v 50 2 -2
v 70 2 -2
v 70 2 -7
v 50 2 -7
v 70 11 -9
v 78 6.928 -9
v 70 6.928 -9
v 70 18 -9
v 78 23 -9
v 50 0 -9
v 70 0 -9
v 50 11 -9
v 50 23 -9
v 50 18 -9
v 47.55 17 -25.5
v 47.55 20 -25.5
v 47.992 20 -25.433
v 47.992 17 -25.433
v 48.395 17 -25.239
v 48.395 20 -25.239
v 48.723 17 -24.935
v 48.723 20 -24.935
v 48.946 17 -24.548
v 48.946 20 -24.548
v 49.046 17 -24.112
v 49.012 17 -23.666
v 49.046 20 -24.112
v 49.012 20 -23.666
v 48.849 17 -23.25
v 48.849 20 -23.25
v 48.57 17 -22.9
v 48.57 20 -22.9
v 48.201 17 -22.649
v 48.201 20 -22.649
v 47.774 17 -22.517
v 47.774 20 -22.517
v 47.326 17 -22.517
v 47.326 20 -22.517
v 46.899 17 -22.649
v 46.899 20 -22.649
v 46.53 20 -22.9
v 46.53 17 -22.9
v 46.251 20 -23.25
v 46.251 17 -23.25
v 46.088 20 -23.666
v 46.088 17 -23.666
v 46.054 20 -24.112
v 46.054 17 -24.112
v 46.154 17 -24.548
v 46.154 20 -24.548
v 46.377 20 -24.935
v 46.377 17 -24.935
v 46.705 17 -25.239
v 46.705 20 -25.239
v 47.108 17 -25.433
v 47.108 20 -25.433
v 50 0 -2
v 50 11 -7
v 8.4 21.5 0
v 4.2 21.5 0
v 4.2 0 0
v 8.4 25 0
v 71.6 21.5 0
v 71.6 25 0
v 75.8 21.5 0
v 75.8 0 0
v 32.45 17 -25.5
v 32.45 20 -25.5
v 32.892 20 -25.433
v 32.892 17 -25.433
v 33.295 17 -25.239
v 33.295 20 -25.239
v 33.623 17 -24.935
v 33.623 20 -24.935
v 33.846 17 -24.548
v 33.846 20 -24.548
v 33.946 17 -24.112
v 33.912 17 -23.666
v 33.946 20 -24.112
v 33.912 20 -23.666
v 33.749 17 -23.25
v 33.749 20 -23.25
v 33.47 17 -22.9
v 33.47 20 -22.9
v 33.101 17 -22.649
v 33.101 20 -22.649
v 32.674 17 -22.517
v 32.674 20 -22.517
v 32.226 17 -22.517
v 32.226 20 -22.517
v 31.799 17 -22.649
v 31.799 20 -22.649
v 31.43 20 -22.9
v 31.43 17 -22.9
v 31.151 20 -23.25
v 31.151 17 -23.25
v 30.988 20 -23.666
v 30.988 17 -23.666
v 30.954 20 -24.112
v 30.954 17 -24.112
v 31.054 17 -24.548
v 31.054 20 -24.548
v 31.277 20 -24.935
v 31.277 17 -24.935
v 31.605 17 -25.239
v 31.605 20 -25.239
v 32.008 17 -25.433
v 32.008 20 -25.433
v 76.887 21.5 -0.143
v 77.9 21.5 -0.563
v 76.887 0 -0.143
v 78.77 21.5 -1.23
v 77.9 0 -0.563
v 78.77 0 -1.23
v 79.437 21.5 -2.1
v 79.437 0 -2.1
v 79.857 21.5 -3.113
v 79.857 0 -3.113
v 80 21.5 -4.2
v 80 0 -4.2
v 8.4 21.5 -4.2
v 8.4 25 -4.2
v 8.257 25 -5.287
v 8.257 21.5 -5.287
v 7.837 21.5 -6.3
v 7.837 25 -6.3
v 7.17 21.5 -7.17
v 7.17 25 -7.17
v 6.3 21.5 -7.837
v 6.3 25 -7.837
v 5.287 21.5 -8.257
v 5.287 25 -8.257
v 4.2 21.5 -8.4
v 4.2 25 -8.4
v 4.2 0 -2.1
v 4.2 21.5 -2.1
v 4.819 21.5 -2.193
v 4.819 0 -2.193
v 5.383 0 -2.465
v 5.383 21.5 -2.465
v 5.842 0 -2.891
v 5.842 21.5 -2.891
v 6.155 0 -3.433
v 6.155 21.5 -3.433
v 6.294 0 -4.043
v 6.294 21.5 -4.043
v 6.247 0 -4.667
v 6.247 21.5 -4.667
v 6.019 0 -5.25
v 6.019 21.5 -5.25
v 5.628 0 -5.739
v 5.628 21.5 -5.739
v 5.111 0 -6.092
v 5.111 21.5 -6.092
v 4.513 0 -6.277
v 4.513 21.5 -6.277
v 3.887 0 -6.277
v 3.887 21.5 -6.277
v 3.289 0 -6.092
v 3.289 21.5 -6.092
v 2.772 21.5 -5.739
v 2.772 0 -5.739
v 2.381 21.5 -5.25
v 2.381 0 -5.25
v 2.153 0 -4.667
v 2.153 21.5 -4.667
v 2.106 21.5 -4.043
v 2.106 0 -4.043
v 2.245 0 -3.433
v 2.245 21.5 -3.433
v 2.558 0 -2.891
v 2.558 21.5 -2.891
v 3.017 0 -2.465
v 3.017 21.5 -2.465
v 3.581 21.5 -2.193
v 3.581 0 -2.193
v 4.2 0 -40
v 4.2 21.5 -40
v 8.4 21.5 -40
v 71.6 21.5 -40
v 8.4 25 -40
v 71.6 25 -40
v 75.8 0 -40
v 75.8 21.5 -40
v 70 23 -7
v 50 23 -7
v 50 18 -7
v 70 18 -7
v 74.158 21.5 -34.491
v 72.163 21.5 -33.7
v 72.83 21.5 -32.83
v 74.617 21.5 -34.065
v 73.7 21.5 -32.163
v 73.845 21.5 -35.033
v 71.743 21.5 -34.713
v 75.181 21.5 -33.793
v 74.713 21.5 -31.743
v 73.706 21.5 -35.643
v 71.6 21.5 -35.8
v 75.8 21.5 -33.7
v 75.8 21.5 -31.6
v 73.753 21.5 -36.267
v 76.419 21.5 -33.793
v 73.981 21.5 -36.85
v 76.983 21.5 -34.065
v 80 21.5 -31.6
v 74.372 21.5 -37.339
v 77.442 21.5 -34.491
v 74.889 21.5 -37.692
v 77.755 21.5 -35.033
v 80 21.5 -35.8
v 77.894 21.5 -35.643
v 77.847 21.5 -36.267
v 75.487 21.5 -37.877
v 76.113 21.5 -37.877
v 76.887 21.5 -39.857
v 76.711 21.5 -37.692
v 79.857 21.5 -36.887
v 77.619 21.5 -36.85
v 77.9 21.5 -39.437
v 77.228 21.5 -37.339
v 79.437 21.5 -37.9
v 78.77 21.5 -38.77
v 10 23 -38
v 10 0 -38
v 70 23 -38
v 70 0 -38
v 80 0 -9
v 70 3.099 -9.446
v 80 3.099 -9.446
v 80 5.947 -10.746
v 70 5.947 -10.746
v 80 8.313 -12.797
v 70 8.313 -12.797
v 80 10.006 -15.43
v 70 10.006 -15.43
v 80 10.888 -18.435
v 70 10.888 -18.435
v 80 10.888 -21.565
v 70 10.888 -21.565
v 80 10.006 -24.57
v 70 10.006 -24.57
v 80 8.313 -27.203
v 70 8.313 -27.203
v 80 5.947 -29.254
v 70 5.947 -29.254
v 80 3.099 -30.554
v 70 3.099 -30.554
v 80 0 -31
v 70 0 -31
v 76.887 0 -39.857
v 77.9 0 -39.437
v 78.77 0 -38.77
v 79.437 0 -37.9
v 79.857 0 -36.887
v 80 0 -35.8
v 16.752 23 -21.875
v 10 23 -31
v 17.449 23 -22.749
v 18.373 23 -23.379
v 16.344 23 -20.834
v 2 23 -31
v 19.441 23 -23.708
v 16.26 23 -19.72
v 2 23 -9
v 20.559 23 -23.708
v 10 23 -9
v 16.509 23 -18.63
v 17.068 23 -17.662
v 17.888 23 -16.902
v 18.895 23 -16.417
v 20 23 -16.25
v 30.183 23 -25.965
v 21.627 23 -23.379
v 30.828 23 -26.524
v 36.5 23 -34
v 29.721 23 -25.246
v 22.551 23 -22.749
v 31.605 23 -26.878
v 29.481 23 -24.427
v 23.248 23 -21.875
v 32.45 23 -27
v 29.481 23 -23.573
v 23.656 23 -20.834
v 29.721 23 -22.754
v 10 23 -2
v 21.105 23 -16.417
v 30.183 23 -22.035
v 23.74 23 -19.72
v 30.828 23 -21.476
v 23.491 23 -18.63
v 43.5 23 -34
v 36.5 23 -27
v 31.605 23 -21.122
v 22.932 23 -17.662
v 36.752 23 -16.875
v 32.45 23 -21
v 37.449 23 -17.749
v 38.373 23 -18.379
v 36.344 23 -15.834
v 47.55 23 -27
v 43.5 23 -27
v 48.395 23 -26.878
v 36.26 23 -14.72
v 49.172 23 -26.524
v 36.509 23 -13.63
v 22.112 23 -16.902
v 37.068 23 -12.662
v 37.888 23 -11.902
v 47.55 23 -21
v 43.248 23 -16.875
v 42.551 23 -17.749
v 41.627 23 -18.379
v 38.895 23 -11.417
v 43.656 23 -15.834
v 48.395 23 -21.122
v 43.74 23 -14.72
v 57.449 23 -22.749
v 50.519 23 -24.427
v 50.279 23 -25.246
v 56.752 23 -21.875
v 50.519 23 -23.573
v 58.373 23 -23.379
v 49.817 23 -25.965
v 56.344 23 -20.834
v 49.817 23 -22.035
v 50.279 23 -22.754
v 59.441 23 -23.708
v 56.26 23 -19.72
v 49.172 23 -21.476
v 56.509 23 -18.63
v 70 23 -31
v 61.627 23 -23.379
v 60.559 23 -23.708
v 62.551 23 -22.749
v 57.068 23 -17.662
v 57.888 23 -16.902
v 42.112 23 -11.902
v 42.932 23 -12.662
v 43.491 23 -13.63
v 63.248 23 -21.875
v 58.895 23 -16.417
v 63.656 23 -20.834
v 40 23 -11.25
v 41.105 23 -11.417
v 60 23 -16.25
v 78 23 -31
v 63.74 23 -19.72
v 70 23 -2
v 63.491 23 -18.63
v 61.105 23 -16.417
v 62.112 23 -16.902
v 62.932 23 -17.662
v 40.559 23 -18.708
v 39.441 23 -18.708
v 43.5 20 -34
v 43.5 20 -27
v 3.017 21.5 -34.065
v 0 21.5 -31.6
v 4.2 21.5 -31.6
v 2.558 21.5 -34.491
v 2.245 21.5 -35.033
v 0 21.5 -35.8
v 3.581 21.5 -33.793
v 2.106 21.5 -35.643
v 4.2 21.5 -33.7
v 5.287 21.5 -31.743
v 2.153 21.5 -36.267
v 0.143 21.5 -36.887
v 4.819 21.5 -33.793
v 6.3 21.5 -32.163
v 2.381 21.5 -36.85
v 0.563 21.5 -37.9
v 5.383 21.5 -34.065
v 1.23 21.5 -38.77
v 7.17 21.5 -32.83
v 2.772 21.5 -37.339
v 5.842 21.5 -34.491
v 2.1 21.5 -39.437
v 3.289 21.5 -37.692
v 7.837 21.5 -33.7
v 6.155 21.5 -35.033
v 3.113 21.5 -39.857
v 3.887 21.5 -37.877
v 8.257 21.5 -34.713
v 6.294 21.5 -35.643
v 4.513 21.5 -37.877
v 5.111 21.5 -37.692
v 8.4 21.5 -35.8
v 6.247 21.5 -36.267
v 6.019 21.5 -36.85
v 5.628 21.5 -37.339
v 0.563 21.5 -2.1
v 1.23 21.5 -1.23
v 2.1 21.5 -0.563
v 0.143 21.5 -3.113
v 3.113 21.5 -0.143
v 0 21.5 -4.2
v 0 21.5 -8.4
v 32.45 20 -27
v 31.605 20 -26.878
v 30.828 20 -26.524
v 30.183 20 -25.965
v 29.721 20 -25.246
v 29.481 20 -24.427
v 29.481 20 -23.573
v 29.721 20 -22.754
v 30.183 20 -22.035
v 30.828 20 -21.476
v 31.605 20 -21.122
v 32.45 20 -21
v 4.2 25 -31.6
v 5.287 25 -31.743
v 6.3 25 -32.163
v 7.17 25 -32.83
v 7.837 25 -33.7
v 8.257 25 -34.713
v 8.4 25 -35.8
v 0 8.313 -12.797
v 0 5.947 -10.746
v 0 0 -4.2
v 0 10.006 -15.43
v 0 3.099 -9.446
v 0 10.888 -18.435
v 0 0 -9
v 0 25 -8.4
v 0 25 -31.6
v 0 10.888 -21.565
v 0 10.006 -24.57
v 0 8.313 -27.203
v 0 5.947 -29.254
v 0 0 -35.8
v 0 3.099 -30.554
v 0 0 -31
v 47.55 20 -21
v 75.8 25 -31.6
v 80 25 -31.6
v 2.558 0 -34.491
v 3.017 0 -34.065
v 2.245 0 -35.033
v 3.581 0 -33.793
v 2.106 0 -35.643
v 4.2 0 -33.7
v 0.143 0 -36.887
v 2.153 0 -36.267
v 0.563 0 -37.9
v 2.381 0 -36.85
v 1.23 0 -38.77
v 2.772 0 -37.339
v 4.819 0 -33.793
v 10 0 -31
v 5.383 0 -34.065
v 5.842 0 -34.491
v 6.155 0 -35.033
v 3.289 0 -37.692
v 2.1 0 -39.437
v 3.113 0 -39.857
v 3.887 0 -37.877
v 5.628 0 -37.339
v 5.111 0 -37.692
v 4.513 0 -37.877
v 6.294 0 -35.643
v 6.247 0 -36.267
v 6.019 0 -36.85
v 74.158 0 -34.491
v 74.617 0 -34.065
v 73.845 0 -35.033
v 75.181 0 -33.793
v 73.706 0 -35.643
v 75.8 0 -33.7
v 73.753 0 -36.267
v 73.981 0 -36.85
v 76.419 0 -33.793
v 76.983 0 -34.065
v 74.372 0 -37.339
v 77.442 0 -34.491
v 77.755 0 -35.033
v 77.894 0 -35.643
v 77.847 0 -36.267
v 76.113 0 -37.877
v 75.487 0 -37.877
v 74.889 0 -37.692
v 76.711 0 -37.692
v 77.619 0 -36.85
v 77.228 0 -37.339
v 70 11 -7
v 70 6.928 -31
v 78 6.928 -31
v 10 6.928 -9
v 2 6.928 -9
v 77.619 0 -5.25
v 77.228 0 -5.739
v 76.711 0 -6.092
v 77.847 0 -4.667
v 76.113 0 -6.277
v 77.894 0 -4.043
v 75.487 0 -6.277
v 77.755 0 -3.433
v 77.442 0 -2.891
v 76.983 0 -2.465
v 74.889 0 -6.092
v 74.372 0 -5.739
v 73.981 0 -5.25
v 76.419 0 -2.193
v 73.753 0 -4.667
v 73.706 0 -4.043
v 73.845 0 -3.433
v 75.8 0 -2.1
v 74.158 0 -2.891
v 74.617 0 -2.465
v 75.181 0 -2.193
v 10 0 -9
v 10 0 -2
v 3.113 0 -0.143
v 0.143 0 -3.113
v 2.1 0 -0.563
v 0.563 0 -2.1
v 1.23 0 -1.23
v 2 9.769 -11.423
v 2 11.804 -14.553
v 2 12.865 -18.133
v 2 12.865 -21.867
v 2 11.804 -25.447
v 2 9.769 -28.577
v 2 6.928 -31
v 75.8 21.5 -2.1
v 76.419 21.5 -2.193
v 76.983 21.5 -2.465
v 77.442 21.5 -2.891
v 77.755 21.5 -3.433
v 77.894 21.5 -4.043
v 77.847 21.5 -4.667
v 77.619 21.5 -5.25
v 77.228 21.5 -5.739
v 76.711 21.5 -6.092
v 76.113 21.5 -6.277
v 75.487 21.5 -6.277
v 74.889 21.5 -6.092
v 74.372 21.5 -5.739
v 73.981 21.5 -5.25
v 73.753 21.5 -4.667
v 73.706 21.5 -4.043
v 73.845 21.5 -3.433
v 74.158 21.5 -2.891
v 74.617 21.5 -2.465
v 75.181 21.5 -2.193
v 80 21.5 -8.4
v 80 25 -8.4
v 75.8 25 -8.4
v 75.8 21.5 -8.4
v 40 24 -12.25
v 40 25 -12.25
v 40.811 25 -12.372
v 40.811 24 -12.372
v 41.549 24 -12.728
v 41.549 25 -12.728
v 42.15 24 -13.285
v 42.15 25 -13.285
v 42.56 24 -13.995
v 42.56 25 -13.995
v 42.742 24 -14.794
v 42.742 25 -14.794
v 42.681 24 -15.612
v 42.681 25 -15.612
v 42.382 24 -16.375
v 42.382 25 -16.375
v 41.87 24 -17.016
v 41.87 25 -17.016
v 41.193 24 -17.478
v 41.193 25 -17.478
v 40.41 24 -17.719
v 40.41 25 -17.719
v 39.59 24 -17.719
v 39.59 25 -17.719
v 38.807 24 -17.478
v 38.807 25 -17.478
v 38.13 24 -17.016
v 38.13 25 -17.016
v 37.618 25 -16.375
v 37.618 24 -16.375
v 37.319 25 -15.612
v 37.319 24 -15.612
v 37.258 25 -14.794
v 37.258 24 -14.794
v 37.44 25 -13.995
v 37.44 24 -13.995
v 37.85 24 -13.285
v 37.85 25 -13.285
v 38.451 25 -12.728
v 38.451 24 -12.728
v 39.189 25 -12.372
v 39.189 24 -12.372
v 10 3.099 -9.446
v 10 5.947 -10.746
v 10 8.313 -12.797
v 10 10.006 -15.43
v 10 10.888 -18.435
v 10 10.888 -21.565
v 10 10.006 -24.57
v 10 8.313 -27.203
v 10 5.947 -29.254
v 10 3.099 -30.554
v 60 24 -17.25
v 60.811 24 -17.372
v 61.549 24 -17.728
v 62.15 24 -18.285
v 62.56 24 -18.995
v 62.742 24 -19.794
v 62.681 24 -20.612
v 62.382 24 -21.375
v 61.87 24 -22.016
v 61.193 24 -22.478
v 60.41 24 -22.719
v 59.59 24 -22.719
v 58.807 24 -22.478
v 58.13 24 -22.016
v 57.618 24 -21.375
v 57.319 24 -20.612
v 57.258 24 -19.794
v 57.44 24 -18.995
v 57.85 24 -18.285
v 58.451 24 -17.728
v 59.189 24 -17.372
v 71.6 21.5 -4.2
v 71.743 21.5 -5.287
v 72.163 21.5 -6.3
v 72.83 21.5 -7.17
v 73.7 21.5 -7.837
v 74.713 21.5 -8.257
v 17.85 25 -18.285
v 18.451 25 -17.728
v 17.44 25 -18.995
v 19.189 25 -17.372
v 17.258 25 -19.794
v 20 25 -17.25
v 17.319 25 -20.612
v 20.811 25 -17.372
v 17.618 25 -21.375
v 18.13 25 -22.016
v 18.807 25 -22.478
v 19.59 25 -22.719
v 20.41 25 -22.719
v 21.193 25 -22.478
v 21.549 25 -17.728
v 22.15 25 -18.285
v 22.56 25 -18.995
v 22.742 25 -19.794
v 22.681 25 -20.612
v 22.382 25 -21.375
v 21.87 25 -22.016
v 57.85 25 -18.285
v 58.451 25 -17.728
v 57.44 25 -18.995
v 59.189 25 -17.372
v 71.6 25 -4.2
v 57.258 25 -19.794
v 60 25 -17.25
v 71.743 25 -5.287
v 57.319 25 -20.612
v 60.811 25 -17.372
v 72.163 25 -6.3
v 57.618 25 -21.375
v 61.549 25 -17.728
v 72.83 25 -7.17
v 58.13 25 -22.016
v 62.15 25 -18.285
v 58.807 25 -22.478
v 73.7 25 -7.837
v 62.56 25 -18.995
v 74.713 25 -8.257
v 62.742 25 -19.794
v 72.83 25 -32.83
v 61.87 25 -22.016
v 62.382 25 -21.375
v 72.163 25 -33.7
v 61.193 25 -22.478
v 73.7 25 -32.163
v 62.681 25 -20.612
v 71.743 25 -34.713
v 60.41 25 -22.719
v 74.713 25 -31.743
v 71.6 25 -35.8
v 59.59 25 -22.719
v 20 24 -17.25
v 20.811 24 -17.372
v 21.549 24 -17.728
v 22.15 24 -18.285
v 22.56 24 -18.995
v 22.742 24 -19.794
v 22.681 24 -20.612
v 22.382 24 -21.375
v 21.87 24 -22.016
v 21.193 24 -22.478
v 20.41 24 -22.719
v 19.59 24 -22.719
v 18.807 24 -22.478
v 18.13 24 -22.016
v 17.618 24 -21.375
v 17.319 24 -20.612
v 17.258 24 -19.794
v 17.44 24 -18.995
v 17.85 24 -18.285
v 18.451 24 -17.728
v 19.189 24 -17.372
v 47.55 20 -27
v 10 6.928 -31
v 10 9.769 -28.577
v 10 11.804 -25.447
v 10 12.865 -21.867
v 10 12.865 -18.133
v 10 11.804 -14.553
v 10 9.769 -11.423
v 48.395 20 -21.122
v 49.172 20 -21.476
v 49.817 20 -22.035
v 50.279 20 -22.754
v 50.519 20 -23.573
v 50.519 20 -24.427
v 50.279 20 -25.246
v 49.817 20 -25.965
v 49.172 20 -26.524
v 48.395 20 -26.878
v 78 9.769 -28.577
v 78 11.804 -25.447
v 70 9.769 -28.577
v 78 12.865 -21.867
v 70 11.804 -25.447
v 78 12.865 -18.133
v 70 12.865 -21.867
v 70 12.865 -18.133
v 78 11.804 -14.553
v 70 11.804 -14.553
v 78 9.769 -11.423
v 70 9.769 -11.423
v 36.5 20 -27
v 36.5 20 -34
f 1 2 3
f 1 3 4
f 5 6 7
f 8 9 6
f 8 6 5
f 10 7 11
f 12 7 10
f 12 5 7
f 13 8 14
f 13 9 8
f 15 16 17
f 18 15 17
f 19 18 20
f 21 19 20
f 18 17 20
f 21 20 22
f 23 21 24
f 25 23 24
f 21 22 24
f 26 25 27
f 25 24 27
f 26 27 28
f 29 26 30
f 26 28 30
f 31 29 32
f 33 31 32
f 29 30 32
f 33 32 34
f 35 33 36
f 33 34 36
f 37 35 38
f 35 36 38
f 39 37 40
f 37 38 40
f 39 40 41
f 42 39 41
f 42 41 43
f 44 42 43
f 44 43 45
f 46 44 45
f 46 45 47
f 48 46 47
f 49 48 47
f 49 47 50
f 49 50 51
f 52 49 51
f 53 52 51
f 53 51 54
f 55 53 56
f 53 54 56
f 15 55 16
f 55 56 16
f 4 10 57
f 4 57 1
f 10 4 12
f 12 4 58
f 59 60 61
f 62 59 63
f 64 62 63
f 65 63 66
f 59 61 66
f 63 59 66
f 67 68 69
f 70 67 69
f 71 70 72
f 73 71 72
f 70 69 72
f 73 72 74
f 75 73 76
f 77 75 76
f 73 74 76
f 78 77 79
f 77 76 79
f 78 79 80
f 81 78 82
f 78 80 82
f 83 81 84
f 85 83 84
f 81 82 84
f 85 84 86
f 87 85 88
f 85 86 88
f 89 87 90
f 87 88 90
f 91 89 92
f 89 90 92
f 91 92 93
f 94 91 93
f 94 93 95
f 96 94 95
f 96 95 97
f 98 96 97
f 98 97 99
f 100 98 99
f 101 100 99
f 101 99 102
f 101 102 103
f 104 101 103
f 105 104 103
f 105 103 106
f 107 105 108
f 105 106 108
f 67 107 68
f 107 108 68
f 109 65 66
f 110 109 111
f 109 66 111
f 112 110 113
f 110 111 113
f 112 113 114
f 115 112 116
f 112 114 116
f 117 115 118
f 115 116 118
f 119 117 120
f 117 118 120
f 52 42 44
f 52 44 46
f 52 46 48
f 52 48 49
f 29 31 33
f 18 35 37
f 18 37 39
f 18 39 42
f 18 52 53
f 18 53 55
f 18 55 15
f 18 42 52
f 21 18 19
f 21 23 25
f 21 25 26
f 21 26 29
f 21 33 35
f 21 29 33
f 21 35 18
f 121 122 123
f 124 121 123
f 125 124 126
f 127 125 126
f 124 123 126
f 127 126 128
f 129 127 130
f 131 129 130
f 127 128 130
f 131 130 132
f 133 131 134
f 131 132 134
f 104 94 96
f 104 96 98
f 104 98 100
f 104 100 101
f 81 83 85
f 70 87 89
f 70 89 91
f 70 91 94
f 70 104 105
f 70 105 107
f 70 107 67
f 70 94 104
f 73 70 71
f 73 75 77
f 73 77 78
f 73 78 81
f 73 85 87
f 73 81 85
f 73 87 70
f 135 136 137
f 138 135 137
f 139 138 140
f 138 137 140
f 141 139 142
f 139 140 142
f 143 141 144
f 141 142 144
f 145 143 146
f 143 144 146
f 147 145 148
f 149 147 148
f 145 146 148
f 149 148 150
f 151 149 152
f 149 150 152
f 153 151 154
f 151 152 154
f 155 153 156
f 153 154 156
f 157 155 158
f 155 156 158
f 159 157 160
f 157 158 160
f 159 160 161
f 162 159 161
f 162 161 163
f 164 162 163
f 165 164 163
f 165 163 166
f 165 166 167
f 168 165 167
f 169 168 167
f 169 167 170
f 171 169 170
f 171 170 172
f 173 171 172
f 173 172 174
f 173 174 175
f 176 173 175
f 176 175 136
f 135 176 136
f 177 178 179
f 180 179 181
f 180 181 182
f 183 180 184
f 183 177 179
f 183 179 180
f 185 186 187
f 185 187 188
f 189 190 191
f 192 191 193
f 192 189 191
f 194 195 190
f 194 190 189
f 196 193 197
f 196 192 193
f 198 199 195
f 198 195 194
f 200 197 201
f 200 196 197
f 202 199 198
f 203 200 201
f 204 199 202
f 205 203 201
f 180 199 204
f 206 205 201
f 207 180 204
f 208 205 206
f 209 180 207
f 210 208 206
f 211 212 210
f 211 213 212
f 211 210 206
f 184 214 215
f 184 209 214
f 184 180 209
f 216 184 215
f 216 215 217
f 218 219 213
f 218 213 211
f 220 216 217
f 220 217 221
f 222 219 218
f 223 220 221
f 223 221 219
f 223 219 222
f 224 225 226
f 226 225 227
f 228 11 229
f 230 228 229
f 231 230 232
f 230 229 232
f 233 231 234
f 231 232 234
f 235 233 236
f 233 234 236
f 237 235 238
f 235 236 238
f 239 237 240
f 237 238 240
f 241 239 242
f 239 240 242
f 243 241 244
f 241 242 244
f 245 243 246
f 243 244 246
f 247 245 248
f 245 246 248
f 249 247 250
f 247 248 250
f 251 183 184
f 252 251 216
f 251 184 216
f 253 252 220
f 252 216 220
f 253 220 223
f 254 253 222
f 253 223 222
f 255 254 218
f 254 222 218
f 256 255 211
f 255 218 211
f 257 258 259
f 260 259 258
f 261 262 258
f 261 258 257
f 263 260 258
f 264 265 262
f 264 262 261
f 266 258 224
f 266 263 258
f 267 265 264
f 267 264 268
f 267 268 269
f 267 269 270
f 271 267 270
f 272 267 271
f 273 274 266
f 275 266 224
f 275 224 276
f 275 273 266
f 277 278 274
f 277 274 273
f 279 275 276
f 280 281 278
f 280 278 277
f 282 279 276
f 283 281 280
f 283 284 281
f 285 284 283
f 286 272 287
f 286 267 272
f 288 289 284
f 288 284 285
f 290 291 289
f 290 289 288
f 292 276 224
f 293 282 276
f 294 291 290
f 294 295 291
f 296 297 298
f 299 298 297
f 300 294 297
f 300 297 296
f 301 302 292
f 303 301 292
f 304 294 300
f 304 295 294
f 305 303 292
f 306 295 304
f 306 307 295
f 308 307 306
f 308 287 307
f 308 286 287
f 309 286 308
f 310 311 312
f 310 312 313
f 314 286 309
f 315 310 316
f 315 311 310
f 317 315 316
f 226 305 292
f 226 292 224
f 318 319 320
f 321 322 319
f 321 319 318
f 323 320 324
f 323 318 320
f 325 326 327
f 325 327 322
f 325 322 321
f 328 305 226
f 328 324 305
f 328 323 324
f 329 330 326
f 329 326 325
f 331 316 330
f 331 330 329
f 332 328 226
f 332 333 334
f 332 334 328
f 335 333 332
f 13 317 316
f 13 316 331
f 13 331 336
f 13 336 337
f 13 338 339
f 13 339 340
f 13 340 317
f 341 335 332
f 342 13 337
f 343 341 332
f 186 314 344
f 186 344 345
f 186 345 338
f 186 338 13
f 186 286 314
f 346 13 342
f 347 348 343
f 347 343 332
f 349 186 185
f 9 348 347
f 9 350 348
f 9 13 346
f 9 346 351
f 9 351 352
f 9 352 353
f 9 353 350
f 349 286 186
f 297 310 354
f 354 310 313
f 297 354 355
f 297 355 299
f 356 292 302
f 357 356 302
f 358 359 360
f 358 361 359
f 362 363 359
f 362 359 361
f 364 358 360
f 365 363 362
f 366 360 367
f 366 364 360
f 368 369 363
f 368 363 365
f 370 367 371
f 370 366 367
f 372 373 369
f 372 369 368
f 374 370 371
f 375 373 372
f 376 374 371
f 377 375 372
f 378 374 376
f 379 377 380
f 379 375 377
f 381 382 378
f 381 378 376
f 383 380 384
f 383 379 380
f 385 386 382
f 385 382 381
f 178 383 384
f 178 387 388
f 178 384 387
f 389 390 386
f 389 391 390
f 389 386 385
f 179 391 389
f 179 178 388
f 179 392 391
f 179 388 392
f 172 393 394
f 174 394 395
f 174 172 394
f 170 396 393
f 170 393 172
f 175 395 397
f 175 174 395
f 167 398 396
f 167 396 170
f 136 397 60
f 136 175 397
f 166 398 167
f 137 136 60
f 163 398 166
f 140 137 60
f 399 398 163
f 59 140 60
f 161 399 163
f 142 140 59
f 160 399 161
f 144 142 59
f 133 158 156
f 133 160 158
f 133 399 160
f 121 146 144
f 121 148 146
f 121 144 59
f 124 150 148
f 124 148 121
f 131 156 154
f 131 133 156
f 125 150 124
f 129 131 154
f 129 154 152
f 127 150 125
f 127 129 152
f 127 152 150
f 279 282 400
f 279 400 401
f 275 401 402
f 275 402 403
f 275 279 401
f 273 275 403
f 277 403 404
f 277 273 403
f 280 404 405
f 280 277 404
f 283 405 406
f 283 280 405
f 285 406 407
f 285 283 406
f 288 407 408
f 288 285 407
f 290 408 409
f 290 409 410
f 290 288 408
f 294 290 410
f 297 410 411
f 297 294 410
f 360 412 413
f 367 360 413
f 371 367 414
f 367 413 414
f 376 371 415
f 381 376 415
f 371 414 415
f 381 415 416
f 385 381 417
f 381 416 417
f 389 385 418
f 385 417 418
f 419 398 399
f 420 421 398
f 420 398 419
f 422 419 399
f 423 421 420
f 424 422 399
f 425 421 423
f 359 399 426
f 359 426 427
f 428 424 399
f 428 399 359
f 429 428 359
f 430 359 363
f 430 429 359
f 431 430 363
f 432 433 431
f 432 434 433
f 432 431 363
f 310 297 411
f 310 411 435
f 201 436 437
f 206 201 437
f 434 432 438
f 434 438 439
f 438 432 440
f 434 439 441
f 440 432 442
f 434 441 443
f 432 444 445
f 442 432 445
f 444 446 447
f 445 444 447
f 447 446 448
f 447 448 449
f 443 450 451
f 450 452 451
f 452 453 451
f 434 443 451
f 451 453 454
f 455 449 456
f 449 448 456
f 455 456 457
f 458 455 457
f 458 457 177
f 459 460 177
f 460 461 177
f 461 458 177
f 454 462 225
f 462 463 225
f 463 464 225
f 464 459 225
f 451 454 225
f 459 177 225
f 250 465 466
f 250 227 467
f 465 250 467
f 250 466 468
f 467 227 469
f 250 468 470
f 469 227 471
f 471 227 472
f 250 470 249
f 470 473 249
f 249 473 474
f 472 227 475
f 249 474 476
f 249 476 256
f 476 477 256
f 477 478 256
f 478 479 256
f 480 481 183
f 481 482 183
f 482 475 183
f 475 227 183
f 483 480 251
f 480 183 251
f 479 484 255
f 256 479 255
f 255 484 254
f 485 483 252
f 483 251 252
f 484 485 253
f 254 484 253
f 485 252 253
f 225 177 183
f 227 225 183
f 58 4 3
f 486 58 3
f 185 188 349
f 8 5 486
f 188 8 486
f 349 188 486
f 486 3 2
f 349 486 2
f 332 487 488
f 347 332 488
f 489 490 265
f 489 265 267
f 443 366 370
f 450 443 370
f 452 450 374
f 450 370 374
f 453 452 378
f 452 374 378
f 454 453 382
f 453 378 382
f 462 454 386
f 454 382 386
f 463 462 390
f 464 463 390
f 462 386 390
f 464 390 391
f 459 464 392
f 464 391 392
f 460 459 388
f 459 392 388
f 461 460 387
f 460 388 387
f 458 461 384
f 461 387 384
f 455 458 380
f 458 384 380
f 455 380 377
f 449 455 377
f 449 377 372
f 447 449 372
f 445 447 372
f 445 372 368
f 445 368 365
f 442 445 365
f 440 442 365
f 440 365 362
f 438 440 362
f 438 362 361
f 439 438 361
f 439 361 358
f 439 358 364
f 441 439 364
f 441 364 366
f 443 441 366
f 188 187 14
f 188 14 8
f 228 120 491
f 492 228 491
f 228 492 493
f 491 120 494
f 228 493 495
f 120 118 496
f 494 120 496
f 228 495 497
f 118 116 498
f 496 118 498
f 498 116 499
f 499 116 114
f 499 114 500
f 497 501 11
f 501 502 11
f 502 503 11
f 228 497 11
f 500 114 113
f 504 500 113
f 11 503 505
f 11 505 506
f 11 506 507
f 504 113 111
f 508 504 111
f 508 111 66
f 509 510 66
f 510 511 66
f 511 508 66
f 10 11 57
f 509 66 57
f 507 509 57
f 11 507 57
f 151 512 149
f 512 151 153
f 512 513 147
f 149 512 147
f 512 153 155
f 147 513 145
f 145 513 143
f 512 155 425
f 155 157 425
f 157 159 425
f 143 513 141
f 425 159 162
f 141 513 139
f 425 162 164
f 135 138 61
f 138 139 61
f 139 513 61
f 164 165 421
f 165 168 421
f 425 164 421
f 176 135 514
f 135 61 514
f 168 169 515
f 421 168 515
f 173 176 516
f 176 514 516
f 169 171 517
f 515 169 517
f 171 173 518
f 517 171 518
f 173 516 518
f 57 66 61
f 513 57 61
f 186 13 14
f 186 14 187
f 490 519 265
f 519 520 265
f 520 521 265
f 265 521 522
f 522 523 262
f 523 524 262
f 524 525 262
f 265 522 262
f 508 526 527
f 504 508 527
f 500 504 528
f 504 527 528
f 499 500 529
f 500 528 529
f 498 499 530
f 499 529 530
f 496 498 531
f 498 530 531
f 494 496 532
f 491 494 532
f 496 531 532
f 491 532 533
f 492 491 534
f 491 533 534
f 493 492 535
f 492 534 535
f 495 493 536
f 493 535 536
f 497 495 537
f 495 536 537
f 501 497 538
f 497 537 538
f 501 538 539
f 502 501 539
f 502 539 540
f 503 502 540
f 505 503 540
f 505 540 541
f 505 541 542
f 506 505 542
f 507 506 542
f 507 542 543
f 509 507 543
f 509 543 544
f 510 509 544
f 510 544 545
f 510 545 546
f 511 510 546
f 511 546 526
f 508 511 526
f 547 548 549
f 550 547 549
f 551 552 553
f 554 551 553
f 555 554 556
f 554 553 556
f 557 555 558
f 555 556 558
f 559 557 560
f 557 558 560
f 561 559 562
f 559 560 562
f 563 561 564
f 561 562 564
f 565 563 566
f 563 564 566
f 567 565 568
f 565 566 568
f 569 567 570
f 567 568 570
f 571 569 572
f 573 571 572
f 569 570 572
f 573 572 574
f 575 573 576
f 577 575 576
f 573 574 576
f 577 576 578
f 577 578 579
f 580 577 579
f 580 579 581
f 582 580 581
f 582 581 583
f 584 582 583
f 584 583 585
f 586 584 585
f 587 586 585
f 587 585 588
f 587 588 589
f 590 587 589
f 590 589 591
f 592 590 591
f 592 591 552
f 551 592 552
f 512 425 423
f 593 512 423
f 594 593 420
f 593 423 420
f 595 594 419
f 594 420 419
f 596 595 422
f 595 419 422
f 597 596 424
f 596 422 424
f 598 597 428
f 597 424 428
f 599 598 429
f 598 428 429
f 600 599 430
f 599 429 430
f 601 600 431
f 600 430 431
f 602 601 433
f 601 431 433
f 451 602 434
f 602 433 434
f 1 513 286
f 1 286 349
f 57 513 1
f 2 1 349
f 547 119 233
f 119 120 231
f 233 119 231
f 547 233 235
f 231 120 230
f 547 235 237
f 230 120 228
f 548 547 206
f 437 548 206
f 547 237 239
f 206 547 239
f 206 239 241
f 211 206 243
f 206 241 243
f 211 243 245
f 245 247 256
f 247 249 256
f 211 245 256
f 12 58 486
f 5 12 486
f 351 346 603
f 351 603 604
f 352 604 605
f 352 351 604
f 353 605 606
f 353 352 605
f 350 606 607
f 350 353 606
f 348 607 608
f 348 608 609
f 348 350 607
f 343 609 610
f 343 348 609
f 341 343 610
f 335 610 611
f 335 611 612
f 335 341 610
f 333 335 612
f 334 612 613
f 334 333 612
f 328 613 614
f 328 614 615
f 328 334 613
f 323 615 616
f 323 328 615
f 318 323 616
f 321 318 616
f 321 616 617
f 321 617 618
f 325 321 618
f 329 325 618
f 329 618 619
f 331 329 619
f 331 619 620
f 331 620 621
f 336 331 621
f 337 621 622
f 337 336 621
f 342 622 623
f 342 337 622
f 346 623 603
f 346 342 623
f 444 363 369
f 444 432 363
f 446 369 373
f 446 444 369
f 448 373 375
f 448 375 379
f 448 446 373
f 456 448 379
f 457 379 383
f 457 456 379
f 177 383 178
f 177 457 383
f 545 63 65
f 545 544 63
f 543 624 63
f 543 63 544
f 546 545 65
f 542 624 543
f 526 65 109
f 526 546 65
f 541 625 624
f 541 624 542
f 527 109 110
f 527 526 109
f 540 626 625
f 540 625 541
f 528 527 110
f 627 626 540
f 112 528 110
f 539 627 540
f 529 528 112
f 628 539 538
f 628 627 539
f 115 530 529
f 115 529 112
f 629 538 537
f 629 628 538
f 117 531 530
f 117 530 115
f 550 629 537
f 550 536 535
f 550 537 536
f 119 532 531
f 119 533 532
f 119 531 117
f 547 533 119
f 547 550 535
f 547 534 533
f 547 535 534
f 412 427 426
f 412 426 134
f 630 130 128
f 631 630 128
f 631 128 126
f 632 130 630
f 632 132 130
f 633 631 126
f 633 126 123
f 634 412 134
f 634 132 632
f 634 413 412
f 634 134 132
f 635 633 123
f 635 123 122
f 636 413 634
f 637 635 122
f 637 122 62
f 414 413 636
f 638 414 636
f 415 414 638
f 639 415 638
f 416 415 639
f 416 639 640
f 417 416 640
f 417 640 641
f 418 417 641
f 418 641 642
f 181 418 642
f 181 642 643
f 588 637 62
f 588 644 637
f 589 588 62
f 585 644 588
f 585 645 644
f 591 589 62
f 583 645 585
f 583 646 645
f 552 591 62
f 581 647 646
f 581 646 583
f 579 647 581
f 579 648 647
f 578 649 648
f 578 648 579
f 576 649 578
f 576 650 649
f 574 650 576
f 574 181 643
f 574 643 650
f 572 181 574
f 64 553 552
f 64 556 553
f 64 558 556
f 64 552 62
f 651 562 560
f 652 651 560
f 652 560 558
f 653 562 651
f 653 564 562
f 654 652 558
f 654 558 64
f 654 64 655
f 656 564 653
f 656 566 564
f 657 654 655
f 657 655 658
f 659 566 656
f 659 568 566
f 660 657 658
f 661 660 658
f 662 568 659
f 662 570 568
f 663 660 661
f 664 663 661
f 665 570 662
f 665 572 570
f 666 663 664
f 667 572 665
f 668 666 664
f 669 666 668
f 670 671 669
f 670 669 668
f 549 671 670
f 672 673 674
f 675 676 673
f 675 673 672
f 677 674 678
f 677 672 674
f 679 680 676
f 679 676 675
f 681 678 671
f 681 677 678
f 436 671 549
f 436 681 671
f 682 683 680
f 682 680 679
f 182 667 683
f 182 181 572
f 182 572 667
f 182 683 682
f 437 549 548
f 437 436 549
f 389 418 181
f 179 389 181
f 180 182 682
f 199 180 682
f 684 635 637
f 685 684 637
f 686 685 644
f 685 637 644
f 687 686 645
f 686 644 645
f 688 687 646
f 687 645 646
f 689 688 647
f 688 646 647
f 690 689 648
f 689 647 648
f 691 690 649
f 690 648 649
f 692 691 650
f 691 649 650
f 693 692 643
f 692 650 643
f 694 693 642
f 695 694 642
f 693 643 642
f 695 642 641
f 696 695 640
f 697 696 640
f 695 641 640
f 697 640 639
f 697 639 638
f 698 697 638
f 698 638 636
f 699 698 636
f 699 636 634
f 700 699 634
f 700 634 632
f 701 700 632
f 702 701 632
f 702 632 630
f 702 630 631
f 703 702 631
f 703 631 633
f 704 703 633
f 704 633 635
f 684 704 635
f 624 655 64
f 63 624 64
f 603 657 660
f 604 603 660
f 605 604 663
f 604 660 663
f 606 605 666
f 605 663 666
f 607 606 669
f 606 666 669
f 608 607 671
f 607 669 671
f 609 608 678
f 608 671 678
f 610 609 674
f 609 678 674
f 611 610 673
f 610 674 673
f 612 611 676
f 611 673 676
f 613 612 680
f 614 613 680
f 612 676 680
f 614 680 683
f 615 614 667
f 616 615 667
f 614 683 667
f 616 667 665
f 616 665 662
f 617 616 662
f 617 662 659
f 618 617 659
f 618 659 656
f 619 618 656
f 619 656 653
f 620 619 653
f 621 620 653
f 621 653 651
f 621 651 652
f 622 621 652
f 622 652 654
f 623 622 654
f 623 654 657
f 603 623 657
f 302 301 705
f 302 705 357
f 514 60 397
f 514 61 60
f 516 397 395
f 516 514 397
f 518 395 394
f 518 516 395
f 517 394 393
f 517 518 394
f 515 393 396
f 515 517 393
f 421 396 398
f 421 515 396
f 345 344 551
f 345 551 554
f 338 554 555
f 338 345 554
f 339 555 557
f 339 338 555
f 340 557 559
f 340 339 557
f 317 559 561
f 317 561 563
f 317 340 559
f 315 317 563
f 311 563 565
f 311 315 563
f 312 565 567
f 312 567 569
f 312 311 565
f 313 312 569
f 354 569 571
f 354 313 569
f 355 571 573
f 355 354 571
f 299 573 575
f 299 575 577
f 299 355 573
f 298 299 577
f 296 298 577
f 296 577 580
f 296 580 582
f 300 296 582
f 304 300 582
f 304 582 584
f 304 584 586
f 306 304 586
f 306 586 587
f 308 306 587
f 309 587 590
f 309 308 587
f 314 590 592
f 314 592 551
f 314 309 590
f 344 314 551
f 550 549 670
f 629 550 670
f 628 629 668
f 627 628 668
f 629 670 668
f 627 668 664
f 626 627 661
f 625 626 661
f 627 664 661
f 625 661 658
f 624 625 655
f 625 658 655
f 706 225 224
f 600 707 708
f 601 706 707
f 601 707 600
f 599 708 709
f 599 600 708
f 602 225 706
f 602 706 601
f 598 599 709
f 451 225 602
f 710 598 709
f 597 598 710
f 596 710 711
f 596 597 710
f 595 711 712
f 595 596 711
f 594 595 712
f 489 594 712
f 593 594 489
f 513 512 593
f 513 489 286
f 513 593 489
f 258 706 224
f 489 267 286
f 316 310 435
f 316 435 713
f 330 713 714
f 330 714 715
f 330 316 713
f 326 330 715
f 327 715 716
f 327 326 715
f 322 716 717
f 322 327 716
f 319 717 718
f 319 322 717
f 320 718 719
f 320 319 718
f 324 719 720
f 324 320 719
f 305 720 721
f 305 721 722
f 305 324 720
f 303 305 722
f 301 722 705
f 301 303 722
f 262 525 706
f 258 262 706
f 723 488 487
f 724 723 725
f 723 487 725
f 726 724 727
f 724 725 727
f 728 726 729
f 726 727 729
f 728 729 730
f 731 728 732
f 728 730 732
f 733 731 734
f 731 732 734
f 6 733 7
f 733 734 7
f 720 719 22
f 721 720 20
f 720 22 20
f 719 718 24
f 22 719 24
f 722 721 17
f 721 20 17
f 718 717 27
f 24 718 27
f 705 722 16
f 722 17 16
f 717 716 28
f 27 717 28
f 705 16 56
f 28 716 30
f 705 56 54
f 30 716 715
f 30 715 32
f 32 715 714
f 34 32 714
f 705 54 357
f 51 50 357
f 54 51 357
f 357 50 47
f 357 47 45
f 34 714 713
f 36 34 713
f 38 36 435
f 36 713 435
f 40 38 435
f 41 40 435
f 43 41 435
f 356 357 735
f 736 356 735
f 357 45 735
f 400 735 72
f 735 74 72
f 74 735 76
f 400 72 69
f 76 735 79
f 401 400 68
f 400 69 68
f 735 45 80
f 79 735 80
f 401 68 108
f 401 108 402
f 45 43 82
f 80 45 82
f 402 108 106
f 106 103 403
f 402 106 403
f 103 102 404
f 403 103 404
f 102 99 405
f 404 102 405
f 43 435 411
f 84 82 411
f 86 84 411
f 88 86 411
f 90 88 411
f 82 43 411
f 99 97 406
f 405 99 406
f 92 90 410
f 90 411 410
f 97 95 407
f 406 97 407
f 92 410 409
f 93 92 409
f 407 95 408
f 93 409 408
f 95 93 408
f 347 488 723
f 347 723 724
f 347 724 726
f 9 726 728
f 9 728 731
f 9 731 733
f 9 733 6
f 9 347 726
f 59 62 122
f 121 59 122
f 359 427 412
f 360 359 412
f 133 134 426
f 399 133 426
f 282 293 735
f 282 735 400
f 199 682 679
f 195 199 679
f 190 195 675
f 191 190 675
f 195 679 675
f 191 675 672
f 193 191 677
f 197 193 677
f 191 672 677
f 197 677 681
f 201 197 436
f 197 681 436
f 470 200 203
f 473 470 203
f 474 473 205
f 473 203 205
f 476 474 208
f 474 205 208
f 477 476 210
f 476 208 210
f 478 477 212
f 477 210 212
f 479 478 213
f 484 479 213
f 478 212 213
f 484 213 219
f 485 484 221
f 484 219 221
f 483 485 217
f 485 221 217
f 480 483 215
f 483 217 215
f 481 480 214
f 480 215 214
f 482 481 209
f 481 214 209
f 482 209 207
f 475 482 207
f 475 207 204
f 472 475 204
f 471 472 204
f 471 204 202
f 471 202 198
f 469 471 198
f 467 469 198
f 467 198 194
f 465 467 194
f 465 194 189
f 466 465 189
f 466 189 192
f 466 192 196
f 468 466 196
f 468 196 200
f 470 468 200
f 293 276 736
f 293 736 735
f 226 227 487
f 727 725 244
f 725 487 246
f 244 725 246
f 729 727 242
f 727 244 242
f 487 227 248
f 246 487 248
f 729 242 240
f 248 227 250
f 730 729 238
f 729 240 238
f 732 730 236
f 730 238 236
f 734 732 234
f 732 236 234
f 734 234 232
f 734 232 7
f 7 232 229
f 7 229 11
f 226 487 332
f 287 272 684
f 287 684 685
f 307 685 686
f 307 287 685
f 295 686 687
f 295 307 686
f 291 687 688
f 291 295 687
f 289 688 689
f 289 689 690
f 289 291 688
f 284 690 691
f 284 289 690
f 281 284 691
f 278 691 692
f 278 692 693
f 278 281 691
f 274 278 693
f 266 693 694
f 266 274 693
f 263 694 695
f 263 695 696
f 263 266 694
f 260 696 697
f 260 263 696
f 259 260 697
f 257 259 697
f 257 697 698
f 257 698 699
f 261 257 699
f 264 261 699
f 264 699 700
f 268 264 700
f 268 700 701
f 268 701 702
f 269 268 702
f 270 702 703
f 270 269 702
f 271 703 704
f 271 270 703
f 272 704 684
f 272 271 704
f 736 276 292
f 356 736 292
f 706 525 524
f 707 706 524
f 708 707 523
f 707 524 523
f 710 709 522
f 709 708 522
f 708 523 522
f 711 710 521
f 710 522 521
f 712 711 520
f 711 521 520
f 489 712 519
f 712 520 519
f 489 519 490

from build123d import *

# Parameters (mm, degrees)
ESQUISSE1_W              = 80
ESQUISSE1_H              = 40
BOSS_EXTRU_1_DEPTH       = 25
ENL_V_MAT_EXTRU_4_DEPTH  = 78
ESQUISSE6_W              = 2
ESQUISSE6_H              = 25
BOSS_EXTRU_3_DEPTH       = 40
ESQUISSE7_R              = 11
ENL_V_MAT_EXTRU_5_DEPTH  = 93.870878105
ESQUISSE8_W              = 60
ESQUISSE8_H              = 36
ENL_V_MAT_EXTRU_6_DEPTH  = 23
ESQUISSE9_W              = 10
ESQUISSE9_H              = 9
BOSS_EXTRU_4_DEPTH       = 23
ESQUISSE10_R             = 2.1
ENL_V_MAT_EXTRU_8_DEPTH  = 93.870878105
ESQUISSE11_R             = 2.75
ENL_V_MAT_EXTRU_9_DEPTH  = 93.870878105
CHANFREIN1_SIZE          = 1
ESQUISSE12_R             = 4.2
ESQUISSE12_R_2           = 2.1
ENL_V_MAT_EXTRU_10_DEPTH = 3.5
CONG_1_R                 = 4.2
ESQUISSE13_W             = 7
ESQUISSE13_H             = 7
BOSS_EXTRU_5_DEPTH       = 3
ESQUISSE14_W             = 20
ESQUISSE14_H             = 2
BOSS_EXTRU_16_DEPTH      = 5
ESQUISSE15_W             = 20
ESQUISSE15_H             = 2
BOSS_EXTRU_17_DEPTH      = 7
ESQUISSE17_W             = 20
ESQUISSE17_H             = 2
BOSS_EXTRU_18_DEPTH      = 11
ESQUISSE18_R             = 1.5
BOSS_EXTRU_19_DEPTH      = 3


with BuildPart() as part:
    # Esquisse1 → Boss.-Extru.1 (new body)
    with BuildSketch(Plane(origin=(0, 0, 0), x_dir=(1, 0, 0), z_dir=(0, 1, 0))):
        with Locations((40, 20)):
            Rectangle(ESQUISSE1_W, ESQUISSE1_H)
    extrude(amount=BOSS_EXTRU_1_DEPTH)

    # Esquisse5 → Enlèv. mat.-Extru.4 (cut)
    with BuildSketch(Plane.ZY):
        with BuildLine():
            Line((-2, 23), (-38, 23))
            Line((-38, 23), (-38, 2))
            Line((-38, 2), (-32.845232579, 2))
            ThreePointArc((-32.845232579, 2), (-20, 13), (-7.154767421, 2))
            Line((-7.154767421, 2), (-2, 2))
            Line((-2, 2), (-2, 23))
        make_face()
    extrude(amount=-ENL_V_MAT_EXTRU_4_DEPTH, mode=Mode.SUBTRACT)

    # Esquisse6 → Boss.-Extru.3 (add)
    with BuildSketch(Plane(origin=(0, 0, -40), x_dir=(-1, 0, 0), z_dir=(0, 0, -1))):
        with Locations((-1, 12.5)):
            Rectangle(ESQUISSE6_W, ESQUISSE6_H)
    extrude(amount=-BOSS_EXTRU_3_DEPTH)

    # Esquisse7 → Enlèv. mat.-Extru.5 (cut, through all)
    with BuildSketch(Plane.ZY):
        with Locations((-20, 0)):
            Circle(ESQUISSE7_R)
    extrude(amount=-ENL_V_MAT_EXTRU_5_DEPTH, mode=Mode.SUBTRACT)

    # Esquisse8 → Enlèv. mat.-Extru.6 (cut)
    with BuildSketch(Plane.XZ):
        with Locations((40, -20)):
            Rectangle(ESQUISSE8_W, ESQUISSE8_H)
    extrude(amount=-ENL_V_MAT_EXTRU_6_DEPTH, mode=Mode.SUBTRACT)

    # Esquisse9 → Boss.-Extru.4 (add)
    with BuildSketch(Plane(origin=(0, 25, 0), x_dir=(1, 0, 0), z_dir=(0, 1, 0))):
        with Locations((75, 4.5)):
            Rectangle(ESQUISSE9_W, ESQUISSE9_H)
        with Locations((5, 4.5)):
            Rectangle(ESQUISSE9_W, ESQUISSE9_H)
        with Locations((5, 35.5)):
            Rectangle(ESQUISSE9_W, ESQUISSE9_H)
        with Locations((75, 35.5)):
            Rectangle(ESQUISSE9_W, ESQUISSE9_H)
    extrude(amount=-BOSS_EXTRU_4_DEPTH)

    # Esquisse10 → Enlèv. mat.-Extru.8 (cut, through all)
    with BuildSketch(Plane(origin=(0, 25, 0), x_dir=(1, 0, 0), z_dir=(0, 1, 0))):
        with Locations(Location((75.8, 35.8, 0), (0, 0, 270))):
            Circle(ESQUISSE10_R)
        with Locations(Location((75.8, 4.2, 0), (0, 0, 270))):
            Circle(ESQUISSE10_R)
        with Locations(Location((4.2, 4.2, 0), (0, 0, 270))):
            Circle(ESQUISSE10_R)
        with Locations(Location((4.2, 35.8, 0), (0, 0, 270))):
            Circle(ESQUISSE10_R)
    extrude(amount=-ENL_V_MAT_EXTRU_8_DEPTH, mode=Mode.SUBTRACT)

    # Esquisse11 → Enlèv. mat.-Extru.9 (cut, through all)
    with BuildSketch(Plane(origin=(0, 25, 0), x_dir=(1, 0, 0), z_dir=(0, 1, 0))):
        with Locations(Location((60, 20, 0), (0, 0, 270))):
            Circle(ESQUISSE11_R)
        with Locations(Location((40, 15, 0), (0, 0, 270))):
            Circle(ESQUISSE11_R)
        with Locations(Location((20, 20, 0), (0, 0, 270))):
            Circle(ESQUISSE11_R)
    extrude(amount=-ENL_V_MAT_EXTRU_9_DEPTH, mode=Mode.SUBTRACT)

    # Chanfrein1
    chanfrein1_edges = [part.edges().sort_by_distance(p)[0] for p in [
        (60, 23, -22.75),
        (40, 23, -17.75),
        (20, 23, -22.75),
    ]]
    chamfer(chanfrein1_edges, length=CHANFREIN1_SIZE)

    # Esquisse12 → Enlèv. mat.-Extru.10 (cut)
    with BuildSketch(Plane(origin=(0, 25, 0), x_dir=(1, 0, 0), z_dir=(0, 1, 0))):
        with BuildLine():
            Line((71.6, 4.2), (71.6, 0))
            Line((71.6, 0), (75.8, 0))
            ThreePointArc((75.8, 0), (72.830151519, 1.230151519), (71.6, 4.2))
        make_face()
        with Locations((75.8, 4.2)):
            Circle(ESQUISSE12_R)
        with Locations(Location((75.8, 4.2, 0), (0, 0, 270))):
            Circle(ESQUISSE12_R_2, mode=Mode.SUBTRACT)
        with BuildLine():
            ThreePointArc((80, 4.2), (78.769848481, 1.230151519), (75.8, 0))
            Line((75.8, 0), (80, 0))
            Line((80, 0), (80, 4.2))
        make_face()
        with BuildLine():
            Line((80, 8.4), (75.8, 8.4))
            ThreePointArc((75.8, 8.4), (78.769848481, 7.169848481), (80, 4.2))
            Line((80, 4.2), (80, 8.4))
        make_face()
        with BuildLine():
            Line((75.8, 31.6), (80, 31.6))
            Line((80, 31.6), (80, 35.8))
            ThreePointArc((80, 35.8), (78.769848481, 32.830151519), (75.8, 31.6))
        make_face()
        with Locations((75.8, 35.8)):
            Circle(ESQUISSE12_R)
        with Locations(Location((75.8, 35.8, 0), (0, 0, 270))):
            Circle(ESQUISSE12_R_2, mode=Mode.SUBTRACT)
        with BuildLine():
            ThreePointArc((75.8, 40), (78.769848481, 38.769848481), (80, 35.8))
            Line((80, 35.8), (80, 40))
            Line((80, 40), (75.8, 40))
        make_face()
        with BuildLine():
            Line((71.6, 40), (71.6, 35.8))
            ThreePointArc((71.6, 35.8), (72.830151519, 38.769848481), (75.8, 40))
            Line((75.8, 40), (71.6, 40))
        make_face()
        with BuildLine():
            Line((0, 35.8), (0, 31.6))
            Line((0, 31.6), (4.2, 31.6))
            ThreePointArc((4.2, 31.6), (1.230151519, 32.830151519), (0, 35.8))
        make_face()
        with Locations((4.2, 35.8)):
            Circle(ESQUISSE12_R)
        with Locations(Location((4.2, 35.8, 0), (0, 0, 270))):
            Circle(ESQUISSE12_R_2, mode=Mode.SUBTRACT)
        with BuildLine():
            Line((0, 40), (0, 35.8))
            ThreePointArc((0, 35.8), (1.230151526, 38.769848488), (4.200000019, 40))
            Line((4.200000019, 40), (0, 40))
        make_face()
        with BuildLine():
            ThreePointArc((4.200000019, 40), (7.169848488, 38.769848474), (8.4, 35.8))
            Line((8.4, 35.8), (8.4, 40))
            Line((8.4, 40), (4.200000019, 40))
        make_face()
        with BuildLine():
            ThreePointArc((0, 4.200000008), (1.230151522, 7.169848484), (4.2, 8.4))
            Line((4.2, 8.4), (0, 8.4))
            Line((0, 8.4), (0, 4.200000008))
        make_face()
        with Locations((4.2, 4.2)):
            Circle(ESQUISSE12_R)
        with Locations(Location((4.2, 4.2, 0), (0, 0, 270))):
            Circle(ESQUISSE12_R_2, mode=Mode.SUBTRACT)
        with BuildLine():
            Line((0, 0), (4.2, 0))
            ThreePointArc((4.2, 0), (1.230151516, 1.230151522), (0, 4.200000008))
            Line((0, 4.200000008), (0, 0))
        make_face()
        with BuildLine():
            Line((4.2, 0), (8.4, 0))
            Line((8.4, 0), (8.4, 4.2))
            ThreePointArc((8.4, 4.2), (7.169848481, 1.230151519), (4.2, 0))
        make_face()
    extrude(amount=-ENL_V_MAT_EXTRU_10_DEPTH, mode=Mode.SUBTRACT)

    # Congé1
    cong_1_edges = [part.edges().sort_by_distance(p)[0] for p in [
        (80, 10.75, 0),
        (80, 10.75, -40),
        (0, 10.75, -40),
        (0, 10.75, 0),
    ]]
    fillet(cong_1_edges, radius=CONG_1_R)

    # Esquisse13 → Boss.-Extru.5 (add)
    with BuildSketch(Plane.XZ.offset(-23)):
        with BuildLine():
            Line((32.45, -21), (47.55, -21))
            ThreePointArc((47.55, -21), (50.55, -24), (47.55, -27))
            Line((47.55, -27), (32.45, -27))
            ThreePointArc((32.45, -27), (29.45, -24), (32.45, -21))
        make_face()
        with Locations((40, -30.5)):
            Rectangle(ESQUISSE13_W, ESQUISSE13_H)
    extrude(amount=BOSS_EXTRU_5_DEPTH)

    # Esquisse14 → Boss.-Extru.16 (add)
    with BuildSketch(Plane.XZ.offset(-23)):
        with Locations((60, -8)):
            Rectangle(ESQUISSE14_W, ESQUISSE14_H)
    extrude(amount=BOSS_EXTRU_16_DEPTH)

    # Esquisse15 → Boss.-Extru.17 (add)
    with BuildSketch(Plane(origin=(0, 0, -2), x_dir=(-1, 0, 0), z_dir=(0, 0, -1))):
        with Locations((-60, 1)):
            Rectangle(ESQUISSE15_W, ESQUISSE15_H)
    extrude(amount=BOSS_EXTRU_17_DEPTH)

    # Esquisse17 → Boss.-Extru.18 (add)
    with BuildSketch(Plane.XZ):
        with Locations((60, -8)):
            Rectangle(ESQUISSE17_W, ESQUISSE17_H)
    extrude(amount=-BOSS_EXTRU_18_DEPTH)

    # Esquisse18 → Boss.-Extru.19 (add)
    with BuildSketch(Plane.XZ.offset(-20)):
        with Locations(Location((32.45, -24, 0), (0, 0, 270))):
            Circle(ESQUISSE18_R)
        with Locations(Location((47.55, -24, 0), (0, 0, 270))):
            Circle(ESQUISSE18_R)
    extrude(amount=BOSS_EXTRU_19_DEPTH)


solid = part.part
